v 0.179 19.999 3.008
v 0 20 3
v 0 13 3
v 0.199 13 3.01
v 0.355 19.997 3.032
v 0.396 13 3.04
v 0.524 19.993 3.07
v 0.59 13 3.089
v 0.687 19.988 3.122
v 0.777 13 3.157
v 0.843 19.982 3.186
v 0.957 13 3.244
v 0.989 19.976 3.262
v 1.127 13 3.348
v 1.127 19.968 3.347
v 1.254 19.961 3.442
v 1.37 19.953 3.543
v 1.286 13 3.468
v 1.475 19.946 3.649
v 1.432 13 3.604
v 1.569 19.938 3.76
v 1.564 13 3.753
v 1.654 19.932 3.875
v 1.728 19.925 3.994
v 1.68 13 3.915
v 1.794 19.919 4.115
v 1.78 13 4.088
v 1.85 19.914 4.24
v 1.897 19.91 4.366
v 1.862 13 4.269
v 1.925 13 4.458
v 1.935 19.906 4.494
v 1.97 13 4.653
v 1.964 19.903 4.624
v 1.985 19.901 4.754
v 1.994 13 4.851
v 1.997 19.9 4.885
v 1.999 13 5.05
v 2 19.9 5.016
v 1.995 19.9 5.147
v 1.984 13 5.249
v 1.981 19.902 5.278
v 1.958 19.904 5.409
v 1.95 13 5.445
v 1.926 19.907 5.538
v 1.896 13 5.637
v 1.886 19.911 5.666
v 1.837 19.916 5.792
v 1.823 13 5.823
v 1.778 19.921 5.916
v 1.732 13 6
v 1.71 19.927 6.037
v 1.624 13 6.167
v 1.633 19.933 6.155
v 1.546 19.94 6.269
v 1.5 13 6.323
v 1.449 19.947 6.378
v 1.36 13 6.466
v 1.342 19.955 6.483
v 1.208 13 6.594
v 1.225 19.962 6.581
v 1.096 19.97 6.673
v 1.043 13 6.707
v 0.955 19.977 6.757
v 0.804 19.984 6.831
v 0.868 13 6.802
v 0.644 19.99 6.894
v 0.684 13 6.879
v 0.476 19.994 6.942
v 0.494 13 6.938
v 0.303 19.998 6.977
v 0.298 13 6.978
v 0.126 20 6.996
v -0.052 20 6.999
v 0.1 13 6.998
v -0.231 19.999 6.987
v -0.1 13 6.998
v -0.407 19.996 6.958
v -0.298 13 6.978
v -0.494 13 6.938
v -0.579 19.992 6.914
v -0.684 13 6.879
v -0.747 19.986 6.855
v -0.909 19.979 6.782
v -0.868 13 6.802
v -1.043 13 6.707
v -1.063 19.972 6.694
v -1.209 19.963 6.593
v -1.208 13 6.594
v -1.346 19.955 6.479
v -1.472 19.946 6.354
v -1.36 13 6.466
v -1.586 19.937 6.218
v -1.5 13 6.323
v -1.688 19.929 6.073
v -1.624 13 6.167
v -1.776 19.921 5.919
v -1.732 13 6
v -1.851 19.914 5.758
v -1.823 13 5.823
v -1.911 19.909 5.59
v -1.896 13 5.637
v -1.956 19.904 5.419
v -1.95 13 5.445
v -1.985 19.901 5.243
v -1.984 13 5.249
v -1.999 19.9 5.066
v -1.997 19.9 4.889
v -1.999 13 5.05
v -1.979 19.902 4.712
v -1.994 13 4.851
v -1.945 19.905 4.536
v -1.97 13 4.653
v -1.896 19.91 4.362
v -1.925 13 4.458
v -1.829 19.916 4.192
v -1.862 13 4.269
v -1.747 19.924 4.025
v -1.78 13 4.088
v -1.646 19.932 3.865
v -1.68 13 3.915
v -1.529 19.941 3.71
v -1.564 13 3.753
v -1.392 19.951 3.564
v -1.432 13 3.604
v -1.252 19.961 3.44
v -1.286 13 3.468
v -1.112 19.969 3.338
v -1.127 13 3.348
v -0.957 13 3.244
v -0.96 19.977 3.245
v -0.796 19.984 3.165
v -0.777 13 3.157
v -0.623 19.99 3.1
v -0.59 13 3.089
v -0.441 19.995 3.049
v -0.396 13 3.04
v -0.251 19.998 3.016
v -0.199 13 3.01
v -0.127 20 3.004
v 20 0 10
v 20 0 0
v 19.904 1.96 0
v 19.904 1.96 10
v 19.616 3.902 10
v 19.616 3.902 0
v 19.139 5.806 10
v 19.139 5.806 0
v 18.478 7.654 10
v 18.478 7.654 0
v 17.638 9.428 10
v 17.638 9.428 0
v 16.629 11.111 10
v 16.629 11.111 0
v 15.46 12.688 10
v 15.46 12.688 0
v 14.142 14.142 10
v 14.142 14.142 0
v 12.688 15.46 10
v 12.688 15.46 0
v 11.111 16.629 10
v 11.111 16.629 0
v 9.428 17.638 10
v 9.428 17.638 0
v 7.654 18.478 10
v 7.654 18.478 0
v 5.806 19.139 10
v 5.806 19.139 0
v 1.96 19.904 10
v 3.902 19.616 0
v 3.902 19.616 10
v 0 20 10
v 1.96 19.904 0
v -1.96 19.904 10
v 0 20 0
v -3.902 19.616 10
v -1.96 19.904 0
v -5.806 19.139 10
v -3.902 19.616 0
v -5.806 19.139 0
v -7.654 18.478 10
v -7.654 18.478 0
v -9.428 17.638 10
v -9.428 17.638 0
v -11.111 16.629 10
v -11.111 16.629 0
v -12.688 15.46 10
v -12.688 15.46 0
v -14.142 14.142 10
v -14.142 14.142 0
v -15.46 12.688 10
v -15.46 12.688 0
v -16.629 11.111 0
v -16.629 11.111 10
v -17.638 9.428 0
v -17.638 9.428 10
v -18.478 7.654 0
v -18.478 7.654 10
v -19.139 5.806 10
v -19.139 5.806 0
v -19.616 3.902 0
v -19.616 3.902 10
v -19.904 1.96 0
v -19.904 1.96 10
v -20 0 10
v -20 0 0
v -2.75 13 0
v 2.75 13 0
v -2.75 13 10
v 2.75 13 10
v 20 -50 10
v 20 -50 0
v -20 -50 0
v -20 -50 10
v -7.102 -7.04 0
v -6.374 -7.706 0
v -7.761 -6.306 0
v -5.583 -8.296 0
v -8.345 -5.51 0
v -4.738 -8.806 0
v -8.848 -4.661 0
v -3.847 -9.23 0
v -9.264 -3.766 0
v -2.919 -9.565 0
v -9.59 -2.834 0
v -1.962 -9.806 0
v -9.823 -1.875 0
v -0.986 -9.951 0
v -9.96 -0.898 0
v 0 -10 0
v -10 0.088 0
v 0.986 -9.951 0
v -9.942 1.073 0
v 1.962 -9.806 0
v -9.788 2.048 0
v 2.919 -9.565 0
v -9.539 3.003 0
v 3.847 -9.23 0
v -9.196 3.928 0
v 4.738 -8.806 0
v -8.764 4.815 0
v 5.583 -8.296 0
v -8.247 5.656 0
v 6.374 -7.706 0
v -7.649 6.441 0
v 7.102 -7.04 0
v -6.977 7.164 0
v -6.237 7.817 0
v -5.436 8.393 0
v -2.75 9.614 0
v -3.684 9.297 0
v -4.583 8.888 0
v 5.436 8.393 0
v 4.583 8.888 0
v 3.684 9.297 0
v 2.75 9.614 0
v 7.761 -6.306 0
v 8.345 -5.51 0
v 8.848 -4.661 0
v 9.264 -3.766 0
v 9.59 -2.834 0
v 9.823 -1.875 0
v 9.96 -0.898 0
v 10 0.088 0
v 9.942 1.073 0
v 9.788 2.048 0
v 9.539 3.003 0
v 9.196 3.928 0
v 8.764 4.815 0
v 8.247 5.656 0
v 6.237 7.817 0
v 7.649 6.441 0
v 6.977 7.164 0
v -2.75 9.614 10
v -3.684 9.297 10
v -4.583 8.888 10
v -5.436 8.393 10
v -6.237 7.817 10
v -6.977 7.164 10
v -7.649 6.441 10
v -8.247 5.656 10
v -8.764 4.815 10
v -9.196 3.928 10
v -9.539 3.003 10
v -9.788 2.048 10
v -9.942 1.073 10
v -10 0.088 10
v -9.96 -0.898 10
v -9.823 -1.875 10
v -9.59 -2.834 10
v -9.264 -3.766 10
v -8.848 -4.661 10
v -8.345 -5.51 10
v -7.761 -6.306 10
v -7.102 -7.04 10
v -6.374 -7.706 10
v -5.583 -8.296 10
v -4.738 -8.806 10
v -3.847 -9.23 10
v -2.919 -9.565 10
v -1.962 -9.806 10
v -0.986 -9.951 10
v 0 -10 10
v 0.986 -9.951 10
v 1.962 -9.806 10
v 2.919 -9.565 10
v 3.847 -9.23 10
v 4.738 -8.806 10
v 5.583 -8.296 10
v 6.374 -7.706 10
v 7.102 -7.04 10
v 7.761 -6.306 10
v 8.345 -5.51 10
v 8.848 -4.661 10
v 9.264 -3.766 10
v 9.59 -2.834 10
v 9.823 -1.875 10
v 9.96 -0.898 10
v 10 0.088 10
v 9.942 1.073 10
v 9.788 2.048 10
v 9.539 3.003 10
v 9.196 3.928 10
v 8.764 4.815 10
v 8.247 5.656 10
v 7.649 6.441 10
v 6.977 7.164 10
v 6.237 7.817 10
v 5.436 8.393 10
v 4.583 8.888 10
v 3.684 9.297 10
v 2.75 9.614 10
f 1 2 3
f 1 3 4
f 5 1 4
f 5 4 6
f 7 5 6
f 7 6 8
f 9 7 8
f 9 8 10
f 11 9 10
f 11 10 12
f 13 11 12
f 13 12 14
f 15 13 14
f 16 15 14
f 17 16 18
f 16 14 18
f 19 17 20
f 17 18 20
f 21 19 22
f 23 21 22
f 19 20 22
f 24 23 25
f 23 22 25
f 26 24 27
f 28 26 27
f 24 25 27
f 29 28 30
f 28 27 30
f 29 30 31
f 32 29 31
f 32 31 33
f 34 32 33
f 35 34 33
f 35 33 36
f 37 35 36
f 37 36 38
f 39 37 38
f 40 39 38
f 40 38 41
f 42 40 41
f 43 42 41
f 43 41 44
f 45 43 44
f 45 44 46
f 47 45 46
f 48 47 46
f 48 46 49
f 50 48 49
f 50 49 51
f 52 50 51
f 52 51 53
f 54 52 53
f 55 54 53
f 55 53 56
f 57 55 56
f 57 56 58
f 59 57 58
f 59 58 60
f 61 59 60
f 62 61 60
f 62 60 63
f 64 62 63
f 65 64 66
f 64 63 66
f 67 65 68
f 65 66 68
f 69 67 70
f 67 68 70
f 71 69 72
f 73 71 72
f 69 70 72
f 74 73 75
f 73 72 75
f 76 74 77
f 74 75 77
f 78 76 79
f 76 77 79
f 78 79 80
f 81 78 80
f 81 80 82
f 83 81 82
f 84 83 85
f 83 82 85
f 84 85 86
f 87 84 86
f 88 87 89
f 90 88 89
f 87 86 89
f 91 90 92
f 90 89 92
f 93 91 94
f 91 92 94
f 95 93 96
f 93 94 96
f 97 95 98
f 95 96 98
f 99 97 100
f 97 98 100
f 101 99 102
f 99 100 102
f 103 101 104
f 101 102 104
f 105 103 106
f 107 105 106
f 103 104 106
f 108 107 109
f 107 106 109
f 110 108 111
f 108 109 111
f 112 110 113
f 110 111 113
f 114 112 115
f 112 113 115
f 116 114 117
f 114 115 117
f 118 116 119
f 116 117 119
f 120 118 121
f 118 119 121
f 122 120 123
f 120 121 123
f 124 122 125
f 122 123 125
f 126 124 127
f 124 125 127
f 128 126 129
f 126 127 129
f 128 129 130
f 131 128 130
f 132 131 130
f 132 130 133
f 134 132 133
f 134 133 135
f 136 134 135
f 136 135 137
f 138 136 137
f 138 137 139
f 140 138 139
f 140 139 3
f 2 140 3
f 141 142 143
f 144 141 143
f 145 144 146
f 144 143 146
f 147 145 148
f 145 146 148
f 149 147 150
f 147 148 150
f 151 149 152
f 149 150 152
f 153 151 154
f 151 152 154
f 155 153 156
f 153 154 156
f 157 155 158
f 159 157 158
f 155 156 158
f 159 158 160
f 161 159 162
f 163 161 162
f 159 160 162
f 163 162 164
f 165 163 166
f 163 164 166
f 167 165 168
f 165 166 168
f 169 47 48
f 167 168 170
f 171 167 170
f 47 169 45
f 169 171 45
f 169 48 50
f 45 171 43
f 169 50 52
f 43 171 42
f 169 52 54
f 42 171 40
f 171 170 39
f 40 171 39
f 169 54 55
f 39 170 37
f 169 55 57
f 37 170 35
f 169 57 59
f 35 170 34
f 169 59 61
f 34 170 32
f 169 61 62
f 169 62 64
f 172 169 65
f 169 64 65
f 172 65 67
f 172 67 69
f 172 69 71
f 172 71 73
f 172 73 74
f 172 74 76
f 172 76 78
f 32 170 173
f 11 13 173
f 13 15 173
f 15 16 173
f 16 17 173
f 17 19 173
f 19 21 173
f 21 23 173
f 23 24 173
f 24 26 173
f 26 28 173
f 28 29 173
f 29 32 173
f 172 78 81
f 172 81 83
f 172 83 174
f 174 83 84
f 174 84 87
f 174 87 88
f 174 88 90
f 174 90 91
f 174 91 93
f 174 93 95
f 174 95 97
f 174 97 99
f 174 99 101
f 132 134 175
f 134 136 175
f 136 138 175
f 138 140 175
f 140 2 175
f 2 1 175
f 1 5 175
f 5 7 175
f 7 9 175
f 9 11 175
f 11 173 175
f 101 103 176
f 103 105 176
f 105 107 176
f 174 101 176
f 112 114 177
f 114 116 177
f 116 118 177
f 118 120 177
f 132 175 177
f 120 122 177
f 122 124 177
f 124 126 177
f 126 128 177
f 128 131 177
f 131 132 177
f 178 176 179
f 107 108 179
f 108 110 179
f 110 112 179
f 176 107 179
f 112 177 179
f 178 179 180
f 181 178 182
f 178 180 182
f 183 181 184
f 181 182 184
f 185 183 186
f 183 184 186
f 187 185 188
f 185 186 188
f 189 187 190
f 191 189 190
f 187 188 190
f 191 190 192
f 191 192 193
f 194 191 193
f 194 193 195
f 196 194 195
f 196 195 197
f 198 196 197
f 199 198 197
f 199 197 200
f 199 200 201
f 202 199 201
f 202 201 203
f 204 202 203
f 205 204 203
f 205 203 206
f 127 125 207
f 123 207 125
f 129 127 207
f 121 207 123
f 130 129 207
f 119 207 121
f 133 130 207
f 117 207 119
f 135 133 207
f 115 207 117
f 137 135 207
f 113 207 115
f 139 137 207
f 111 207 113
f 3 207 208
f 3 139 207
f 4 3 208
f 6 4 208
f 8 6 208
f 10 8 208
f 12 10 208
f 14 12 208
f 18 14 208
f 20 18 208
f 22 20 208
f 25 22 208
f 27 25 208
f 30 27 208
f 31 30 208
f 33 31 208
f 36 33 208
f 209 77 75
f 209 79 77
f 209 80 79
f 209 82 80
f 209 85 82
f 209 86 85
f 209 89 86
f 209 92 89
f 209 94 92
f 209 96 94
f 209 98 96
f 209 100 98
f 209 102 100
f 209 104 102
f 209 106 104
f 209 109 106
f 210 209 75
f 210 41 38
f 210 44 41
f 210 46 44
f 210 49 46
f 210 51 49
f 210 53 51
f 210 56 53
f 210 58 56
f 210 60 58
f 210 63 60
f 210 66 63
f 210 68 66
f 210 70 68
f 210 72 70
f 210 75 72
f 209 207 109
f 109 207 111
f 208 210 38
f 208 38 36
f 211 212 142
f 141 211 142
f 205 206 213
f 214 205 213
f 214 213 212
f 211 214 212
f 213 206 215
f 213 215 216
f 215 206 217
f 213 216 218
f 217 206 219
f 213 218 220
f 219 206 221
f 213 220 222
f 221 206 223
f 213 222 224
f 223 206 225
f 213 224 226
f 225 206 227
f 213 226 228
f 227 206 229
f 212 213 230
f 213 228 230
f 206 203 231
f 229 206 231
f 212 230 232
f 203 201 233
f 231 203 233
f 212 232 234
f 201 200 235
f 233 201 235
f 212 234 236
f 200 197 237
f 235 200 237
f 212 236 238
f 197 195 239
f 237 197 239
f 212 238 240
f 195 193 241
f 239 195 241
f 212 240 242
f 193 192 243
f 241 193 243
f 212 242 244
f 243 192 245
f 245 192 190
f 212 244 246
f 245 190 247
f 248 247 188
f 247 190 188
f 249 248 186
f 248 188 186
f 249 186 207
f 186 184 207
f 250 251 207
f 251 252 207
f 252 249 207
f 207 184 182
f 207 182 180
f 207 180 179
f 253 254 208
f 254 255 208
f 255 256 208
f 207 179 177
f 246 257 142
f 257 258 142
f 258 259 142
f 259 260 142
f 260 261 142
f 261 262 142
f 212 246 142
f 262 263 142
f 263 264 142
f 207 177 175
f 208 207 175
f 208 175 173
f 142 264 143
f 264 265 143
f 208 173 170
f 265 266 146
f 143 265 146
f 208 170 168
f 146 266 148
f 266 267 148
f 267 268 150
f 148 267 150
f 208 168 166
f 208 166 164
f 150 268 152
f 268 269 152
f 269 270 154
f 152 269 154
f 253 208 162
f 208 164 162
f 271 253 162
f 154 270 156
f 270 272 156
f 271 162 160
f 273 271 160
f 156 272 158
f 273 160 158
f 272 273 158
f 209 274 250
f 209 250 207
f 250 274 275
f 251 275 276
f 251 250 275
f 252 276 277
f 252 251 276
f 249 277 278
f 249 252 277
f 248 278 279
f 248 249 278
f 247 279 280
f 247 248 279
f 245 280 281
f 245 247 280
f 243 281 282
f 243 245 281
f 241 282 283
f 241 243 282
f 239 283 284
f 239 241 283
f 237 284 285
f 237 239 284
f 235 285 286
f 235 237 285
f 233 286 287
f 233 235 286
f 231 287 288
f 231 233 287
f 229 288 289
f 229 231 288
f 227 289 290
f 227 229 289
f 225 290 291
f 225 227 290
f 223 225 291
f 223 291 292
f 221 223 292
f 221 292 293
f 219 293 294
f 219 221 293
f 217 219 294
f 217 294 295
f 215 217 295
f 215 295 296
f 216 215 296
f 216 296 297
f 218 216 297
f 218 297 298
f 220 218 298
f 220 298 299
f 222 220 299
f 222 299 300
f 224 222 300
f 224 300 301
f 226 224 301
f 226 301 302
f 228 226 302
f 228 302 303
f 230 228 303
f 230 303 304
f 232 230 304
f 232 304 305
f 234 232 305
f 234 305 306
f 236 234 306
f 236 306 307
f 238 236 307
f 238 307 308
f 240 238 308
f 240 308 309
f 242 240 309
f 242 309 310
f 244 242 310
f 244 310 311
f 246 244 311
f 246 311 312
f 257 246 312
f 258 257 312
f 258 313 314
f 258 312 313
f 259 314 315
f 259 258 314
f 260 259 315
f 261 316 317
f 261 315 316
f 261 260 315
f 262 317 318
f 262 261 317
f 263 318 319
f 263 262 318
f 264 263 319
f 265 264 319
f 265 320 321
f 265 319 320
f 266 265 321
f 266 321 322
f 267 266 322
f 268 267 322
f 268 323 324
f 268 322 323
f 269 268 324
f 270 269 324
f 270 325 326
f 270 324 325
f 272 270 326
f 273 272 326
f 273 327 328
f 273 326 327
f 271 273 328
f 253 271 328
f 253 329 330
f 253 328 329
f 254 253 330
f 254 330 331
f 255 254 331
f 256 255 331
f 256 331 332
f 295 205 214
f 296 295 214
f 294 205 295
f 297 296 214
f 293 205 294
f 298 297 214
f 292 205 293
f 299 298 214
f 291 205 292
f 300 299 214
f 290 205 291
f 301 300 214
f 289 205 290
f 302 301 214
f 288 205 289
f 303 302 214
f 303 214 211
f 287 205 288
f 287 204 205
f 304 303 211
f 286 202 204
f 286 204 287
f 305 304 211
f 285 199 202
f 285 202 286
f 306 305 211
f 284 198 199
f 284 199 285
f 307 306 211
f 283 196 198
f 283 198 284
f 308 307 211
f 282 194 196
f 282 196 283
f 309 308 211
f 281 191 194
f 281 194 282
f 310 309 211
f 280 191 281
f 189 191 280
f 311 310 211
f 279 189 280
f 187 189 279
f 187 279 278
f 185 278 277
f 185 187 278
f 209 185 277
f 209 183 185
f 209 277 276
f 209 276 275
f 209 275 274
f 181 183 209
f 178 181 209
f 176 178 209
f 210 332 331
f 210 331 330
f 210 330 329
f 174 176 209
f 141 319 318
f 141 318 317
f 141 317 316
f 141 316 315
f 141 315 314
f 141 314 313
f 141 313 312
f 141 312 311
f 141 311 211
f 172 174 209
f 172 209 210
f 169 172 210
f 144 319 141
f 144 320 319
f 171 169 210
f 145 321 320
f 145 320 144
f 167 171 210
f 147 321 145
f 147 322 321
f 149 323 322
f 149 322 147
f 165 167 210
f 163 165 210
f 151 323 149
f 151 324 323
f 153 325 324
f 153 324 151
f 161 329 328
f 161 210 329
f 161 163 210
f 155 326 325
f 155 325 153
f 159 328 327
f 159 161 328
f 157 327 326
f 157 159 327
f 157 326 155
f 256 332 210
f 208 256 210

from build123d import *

# Parameters (mm, degrees)
SKETCH1_R           = 10
BOSS_EXTRUDE1_DEPTH = 10
SKETCH3_W           = 5.5
SKETCH3_H           = 3.5
CUT_EXTRUDE2_DEPTH  = 11
SKETCH4_R           = 2
CUT_EXTRUDE3_DEPTH  = 7


with BuildPart() as part:
    # Sketch1 → Boss-Extrude1 (new body)
    with BuildSketch(Plane.XY):
        with BuildLine():
            Line((-20, 0), (-20, -50))
            Line((-20, -50), (20, -50))
            Line((20, -50), (20, 0))
            ThreePointArc((20, 0), (0, 20), (-20, 0))
        make_face()
        Circle(SKETCH1_R, mode=Mode.SUBTRACT)
    extrude(amount=BOSS_EXTRUDE1_DEPTH)

    # Sketch3 → Cut-Extrude2 (cut)
    with BuildSketch(Plane.XY.offset(10)):
        with Locations((0, 11.25)):
            Rectangle(SKETCH3_W, SKETCH3_H)
    extrude(amount=-CUT_EXTRUDE2_DEPTH, mode=Mode.SUBTRACT)

    # Sketch4 → Cut-Extrude3 (cut)
    with BuildSketch(Plane.XZ.offset(-13)):
        with Locations(Location((0, 5, 0), (0, 0, 270))):
            Circle(SKETCH4_R)
    extrude(amount=-CUT_EXTRUDE3_DEPTH, mode=Mode.SUBTRACT)


solid = part.part
